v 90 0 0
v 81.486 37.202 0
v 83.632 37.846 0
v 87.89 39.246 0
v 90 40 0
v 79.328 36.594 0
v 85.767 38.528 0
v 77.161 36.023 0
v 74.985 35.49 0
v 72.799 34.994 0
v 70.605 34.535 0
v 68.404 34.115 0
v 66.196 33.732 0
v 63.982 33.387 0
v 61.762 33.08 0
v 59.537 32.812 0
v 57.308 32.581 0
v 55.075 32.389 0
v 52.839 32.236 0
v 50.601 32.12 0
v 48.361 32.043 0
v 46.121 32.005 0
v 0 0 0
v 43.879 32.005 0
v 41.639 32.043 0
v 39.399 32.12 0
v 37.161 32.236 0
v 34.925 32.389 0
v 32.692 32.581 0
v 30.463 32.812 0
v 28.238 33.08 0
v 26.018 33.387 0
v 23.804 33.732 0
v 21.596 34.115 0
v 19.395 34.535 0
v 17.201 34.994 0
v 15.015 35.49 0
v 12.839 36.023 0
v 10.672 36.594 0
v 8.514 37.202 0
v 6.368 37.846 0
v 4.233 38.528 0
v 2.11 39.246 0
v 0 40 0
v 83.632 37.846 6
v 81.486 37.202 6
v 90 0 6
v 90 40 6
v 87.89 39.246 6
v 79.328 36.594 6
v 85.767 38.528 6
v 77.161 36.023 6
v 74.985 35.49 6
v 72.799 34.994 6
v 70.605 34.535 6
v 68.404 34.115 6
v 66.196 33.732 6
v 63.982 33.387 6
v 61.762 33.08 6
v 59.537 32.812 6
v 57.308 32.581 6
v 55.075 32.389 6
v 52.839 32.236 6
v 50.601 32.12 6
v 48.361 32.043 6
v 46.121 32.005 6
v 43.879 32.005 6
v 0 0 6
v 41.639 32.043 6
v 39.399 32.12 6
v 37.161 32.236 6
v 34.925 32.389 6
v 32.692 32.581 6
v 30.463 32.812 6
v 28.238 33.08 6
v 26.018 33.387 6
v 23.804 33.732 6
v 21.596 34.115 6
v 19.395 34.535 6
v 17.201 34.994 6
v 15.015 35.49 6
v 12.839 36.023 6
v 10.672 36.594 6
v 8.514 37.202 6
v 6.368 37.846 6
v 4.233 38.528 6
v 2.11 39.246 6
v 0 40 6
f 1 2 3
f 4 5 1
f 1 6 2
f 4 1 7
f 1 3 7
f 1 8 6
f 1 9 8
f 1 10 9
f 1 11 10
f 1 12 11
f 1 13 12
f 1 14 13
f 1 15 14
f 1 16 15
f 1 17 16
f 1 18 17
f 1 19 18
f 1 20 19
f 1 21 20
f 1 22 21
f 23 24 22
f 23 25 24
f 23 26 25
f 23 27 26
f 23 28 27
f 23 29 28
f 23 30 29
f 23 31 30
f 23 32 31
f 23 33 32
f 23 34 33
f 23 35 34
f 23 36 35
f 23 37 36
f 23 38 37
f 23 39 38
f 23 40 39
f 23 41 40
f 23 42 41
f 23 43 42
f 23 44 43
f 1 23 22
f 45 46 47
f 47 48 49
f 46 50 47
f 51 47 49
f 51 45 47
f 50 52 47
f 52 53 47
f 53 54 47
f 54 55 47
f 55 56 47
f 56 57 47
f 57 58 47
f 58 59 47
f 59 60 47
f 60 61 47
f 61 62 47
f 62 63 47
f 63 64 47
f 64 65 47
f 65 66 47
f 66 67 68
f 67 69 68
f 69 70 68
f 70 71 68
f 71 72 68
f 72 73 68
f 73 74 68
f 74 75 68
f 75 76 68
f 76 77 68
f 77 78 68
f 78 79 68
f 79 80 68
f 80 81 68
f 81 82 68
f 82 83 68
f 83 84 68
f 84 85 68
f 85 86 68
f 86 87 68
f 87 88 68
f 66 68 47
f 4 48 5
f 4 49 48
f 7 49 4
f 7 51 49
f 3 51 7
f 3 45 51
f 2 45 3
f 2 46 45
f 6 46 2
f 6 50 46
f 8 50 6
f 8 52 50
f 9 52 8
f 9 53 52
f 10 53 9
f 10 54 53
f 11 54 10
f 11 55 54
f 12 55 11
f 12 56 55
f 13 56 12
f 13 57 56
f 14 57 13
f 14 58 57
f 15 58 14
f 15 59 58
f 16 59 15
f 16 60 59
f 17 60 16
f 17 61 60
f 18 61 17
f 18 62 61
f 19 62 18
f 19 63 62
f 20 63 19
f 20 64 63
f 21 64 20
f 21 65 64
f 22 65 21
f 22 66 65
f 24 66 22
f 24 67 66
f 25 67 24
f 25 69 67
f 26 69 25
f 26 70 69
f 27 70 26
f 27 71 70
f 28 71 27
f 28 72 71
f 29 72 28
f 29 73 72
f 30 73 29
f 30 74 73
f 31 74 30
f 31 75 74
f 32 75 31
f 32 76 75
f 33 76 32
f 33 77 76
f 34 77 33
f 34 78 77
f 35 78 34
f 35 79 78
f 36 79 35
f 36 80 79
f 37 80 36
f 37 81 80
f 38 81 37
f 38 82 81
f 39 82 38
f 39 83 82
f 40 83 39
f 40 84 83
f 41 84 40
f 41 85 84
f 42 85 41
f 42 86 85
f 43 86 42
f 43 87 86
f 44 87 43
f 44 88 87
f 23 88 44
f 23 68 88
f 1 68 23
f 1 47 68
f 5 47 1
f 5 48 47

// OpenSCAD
$fn = 32;

// ----------------------------------------------------------------------
// Arc profile plate: notch, 44 points
// ----------------------------------------------------------------------

// --- parameters (mm) ---
bar_l = 90;               // bar length, X
bar_w = 40;               // bar width, Y
notch_depth = 8;          // depth of the arc notch at mid-span
arc_r = 130.56;           // radius of the notch arc
arc_angle = 40.32;        // notch arc angle, degrees
arc_step = 1;             // sampling step of the notch arc, degrees
plate_t = 6;              // plate thickness, Z

profile = [[0, 0], [90, 0], [90, 40], [87.89, 39.246], [85.767, 38.528], [83.632, 37.846], [81.486, 37.202], [79.328, 36.594], [77.161, 36.023], [74.985, 35.49], [72.799, 34.994], [70.605, 34.535], [68.404, 34.115], [66.196, 33.732], [63.982, 33.387], [61.762, 33.08], [59.537, 32.812], [57.308, 32.581], [55.075, 32.389], [52.839, 32.236], [50.601, 32.12], [48.361, 32.043], [46.121, 32.005], [43.879, 32.005], [41.639, 32.043], [39.399, 32.12], [37.161, 32.236], [34.925, 32.389], [32.692, 32.581], [30.463, 32.812], [28.238, 33.08], [26.018, 33.387], [23.804, 33.732], [21.596, 34.115], [19.395, 34.535], [17.201, 34.994], [15.015, 35.49], [12.839, 36.023], [10.672, 36.594], [8.514, 37.202], [6.368, 37.846], [4.233, 38.528], [2.11, 39.246], [0, 40]];  // primary outline, 44 points, counter clockwise

// --- the one profile operation ---
linear_extrude(height = plate_t) polygon(points = profile);
